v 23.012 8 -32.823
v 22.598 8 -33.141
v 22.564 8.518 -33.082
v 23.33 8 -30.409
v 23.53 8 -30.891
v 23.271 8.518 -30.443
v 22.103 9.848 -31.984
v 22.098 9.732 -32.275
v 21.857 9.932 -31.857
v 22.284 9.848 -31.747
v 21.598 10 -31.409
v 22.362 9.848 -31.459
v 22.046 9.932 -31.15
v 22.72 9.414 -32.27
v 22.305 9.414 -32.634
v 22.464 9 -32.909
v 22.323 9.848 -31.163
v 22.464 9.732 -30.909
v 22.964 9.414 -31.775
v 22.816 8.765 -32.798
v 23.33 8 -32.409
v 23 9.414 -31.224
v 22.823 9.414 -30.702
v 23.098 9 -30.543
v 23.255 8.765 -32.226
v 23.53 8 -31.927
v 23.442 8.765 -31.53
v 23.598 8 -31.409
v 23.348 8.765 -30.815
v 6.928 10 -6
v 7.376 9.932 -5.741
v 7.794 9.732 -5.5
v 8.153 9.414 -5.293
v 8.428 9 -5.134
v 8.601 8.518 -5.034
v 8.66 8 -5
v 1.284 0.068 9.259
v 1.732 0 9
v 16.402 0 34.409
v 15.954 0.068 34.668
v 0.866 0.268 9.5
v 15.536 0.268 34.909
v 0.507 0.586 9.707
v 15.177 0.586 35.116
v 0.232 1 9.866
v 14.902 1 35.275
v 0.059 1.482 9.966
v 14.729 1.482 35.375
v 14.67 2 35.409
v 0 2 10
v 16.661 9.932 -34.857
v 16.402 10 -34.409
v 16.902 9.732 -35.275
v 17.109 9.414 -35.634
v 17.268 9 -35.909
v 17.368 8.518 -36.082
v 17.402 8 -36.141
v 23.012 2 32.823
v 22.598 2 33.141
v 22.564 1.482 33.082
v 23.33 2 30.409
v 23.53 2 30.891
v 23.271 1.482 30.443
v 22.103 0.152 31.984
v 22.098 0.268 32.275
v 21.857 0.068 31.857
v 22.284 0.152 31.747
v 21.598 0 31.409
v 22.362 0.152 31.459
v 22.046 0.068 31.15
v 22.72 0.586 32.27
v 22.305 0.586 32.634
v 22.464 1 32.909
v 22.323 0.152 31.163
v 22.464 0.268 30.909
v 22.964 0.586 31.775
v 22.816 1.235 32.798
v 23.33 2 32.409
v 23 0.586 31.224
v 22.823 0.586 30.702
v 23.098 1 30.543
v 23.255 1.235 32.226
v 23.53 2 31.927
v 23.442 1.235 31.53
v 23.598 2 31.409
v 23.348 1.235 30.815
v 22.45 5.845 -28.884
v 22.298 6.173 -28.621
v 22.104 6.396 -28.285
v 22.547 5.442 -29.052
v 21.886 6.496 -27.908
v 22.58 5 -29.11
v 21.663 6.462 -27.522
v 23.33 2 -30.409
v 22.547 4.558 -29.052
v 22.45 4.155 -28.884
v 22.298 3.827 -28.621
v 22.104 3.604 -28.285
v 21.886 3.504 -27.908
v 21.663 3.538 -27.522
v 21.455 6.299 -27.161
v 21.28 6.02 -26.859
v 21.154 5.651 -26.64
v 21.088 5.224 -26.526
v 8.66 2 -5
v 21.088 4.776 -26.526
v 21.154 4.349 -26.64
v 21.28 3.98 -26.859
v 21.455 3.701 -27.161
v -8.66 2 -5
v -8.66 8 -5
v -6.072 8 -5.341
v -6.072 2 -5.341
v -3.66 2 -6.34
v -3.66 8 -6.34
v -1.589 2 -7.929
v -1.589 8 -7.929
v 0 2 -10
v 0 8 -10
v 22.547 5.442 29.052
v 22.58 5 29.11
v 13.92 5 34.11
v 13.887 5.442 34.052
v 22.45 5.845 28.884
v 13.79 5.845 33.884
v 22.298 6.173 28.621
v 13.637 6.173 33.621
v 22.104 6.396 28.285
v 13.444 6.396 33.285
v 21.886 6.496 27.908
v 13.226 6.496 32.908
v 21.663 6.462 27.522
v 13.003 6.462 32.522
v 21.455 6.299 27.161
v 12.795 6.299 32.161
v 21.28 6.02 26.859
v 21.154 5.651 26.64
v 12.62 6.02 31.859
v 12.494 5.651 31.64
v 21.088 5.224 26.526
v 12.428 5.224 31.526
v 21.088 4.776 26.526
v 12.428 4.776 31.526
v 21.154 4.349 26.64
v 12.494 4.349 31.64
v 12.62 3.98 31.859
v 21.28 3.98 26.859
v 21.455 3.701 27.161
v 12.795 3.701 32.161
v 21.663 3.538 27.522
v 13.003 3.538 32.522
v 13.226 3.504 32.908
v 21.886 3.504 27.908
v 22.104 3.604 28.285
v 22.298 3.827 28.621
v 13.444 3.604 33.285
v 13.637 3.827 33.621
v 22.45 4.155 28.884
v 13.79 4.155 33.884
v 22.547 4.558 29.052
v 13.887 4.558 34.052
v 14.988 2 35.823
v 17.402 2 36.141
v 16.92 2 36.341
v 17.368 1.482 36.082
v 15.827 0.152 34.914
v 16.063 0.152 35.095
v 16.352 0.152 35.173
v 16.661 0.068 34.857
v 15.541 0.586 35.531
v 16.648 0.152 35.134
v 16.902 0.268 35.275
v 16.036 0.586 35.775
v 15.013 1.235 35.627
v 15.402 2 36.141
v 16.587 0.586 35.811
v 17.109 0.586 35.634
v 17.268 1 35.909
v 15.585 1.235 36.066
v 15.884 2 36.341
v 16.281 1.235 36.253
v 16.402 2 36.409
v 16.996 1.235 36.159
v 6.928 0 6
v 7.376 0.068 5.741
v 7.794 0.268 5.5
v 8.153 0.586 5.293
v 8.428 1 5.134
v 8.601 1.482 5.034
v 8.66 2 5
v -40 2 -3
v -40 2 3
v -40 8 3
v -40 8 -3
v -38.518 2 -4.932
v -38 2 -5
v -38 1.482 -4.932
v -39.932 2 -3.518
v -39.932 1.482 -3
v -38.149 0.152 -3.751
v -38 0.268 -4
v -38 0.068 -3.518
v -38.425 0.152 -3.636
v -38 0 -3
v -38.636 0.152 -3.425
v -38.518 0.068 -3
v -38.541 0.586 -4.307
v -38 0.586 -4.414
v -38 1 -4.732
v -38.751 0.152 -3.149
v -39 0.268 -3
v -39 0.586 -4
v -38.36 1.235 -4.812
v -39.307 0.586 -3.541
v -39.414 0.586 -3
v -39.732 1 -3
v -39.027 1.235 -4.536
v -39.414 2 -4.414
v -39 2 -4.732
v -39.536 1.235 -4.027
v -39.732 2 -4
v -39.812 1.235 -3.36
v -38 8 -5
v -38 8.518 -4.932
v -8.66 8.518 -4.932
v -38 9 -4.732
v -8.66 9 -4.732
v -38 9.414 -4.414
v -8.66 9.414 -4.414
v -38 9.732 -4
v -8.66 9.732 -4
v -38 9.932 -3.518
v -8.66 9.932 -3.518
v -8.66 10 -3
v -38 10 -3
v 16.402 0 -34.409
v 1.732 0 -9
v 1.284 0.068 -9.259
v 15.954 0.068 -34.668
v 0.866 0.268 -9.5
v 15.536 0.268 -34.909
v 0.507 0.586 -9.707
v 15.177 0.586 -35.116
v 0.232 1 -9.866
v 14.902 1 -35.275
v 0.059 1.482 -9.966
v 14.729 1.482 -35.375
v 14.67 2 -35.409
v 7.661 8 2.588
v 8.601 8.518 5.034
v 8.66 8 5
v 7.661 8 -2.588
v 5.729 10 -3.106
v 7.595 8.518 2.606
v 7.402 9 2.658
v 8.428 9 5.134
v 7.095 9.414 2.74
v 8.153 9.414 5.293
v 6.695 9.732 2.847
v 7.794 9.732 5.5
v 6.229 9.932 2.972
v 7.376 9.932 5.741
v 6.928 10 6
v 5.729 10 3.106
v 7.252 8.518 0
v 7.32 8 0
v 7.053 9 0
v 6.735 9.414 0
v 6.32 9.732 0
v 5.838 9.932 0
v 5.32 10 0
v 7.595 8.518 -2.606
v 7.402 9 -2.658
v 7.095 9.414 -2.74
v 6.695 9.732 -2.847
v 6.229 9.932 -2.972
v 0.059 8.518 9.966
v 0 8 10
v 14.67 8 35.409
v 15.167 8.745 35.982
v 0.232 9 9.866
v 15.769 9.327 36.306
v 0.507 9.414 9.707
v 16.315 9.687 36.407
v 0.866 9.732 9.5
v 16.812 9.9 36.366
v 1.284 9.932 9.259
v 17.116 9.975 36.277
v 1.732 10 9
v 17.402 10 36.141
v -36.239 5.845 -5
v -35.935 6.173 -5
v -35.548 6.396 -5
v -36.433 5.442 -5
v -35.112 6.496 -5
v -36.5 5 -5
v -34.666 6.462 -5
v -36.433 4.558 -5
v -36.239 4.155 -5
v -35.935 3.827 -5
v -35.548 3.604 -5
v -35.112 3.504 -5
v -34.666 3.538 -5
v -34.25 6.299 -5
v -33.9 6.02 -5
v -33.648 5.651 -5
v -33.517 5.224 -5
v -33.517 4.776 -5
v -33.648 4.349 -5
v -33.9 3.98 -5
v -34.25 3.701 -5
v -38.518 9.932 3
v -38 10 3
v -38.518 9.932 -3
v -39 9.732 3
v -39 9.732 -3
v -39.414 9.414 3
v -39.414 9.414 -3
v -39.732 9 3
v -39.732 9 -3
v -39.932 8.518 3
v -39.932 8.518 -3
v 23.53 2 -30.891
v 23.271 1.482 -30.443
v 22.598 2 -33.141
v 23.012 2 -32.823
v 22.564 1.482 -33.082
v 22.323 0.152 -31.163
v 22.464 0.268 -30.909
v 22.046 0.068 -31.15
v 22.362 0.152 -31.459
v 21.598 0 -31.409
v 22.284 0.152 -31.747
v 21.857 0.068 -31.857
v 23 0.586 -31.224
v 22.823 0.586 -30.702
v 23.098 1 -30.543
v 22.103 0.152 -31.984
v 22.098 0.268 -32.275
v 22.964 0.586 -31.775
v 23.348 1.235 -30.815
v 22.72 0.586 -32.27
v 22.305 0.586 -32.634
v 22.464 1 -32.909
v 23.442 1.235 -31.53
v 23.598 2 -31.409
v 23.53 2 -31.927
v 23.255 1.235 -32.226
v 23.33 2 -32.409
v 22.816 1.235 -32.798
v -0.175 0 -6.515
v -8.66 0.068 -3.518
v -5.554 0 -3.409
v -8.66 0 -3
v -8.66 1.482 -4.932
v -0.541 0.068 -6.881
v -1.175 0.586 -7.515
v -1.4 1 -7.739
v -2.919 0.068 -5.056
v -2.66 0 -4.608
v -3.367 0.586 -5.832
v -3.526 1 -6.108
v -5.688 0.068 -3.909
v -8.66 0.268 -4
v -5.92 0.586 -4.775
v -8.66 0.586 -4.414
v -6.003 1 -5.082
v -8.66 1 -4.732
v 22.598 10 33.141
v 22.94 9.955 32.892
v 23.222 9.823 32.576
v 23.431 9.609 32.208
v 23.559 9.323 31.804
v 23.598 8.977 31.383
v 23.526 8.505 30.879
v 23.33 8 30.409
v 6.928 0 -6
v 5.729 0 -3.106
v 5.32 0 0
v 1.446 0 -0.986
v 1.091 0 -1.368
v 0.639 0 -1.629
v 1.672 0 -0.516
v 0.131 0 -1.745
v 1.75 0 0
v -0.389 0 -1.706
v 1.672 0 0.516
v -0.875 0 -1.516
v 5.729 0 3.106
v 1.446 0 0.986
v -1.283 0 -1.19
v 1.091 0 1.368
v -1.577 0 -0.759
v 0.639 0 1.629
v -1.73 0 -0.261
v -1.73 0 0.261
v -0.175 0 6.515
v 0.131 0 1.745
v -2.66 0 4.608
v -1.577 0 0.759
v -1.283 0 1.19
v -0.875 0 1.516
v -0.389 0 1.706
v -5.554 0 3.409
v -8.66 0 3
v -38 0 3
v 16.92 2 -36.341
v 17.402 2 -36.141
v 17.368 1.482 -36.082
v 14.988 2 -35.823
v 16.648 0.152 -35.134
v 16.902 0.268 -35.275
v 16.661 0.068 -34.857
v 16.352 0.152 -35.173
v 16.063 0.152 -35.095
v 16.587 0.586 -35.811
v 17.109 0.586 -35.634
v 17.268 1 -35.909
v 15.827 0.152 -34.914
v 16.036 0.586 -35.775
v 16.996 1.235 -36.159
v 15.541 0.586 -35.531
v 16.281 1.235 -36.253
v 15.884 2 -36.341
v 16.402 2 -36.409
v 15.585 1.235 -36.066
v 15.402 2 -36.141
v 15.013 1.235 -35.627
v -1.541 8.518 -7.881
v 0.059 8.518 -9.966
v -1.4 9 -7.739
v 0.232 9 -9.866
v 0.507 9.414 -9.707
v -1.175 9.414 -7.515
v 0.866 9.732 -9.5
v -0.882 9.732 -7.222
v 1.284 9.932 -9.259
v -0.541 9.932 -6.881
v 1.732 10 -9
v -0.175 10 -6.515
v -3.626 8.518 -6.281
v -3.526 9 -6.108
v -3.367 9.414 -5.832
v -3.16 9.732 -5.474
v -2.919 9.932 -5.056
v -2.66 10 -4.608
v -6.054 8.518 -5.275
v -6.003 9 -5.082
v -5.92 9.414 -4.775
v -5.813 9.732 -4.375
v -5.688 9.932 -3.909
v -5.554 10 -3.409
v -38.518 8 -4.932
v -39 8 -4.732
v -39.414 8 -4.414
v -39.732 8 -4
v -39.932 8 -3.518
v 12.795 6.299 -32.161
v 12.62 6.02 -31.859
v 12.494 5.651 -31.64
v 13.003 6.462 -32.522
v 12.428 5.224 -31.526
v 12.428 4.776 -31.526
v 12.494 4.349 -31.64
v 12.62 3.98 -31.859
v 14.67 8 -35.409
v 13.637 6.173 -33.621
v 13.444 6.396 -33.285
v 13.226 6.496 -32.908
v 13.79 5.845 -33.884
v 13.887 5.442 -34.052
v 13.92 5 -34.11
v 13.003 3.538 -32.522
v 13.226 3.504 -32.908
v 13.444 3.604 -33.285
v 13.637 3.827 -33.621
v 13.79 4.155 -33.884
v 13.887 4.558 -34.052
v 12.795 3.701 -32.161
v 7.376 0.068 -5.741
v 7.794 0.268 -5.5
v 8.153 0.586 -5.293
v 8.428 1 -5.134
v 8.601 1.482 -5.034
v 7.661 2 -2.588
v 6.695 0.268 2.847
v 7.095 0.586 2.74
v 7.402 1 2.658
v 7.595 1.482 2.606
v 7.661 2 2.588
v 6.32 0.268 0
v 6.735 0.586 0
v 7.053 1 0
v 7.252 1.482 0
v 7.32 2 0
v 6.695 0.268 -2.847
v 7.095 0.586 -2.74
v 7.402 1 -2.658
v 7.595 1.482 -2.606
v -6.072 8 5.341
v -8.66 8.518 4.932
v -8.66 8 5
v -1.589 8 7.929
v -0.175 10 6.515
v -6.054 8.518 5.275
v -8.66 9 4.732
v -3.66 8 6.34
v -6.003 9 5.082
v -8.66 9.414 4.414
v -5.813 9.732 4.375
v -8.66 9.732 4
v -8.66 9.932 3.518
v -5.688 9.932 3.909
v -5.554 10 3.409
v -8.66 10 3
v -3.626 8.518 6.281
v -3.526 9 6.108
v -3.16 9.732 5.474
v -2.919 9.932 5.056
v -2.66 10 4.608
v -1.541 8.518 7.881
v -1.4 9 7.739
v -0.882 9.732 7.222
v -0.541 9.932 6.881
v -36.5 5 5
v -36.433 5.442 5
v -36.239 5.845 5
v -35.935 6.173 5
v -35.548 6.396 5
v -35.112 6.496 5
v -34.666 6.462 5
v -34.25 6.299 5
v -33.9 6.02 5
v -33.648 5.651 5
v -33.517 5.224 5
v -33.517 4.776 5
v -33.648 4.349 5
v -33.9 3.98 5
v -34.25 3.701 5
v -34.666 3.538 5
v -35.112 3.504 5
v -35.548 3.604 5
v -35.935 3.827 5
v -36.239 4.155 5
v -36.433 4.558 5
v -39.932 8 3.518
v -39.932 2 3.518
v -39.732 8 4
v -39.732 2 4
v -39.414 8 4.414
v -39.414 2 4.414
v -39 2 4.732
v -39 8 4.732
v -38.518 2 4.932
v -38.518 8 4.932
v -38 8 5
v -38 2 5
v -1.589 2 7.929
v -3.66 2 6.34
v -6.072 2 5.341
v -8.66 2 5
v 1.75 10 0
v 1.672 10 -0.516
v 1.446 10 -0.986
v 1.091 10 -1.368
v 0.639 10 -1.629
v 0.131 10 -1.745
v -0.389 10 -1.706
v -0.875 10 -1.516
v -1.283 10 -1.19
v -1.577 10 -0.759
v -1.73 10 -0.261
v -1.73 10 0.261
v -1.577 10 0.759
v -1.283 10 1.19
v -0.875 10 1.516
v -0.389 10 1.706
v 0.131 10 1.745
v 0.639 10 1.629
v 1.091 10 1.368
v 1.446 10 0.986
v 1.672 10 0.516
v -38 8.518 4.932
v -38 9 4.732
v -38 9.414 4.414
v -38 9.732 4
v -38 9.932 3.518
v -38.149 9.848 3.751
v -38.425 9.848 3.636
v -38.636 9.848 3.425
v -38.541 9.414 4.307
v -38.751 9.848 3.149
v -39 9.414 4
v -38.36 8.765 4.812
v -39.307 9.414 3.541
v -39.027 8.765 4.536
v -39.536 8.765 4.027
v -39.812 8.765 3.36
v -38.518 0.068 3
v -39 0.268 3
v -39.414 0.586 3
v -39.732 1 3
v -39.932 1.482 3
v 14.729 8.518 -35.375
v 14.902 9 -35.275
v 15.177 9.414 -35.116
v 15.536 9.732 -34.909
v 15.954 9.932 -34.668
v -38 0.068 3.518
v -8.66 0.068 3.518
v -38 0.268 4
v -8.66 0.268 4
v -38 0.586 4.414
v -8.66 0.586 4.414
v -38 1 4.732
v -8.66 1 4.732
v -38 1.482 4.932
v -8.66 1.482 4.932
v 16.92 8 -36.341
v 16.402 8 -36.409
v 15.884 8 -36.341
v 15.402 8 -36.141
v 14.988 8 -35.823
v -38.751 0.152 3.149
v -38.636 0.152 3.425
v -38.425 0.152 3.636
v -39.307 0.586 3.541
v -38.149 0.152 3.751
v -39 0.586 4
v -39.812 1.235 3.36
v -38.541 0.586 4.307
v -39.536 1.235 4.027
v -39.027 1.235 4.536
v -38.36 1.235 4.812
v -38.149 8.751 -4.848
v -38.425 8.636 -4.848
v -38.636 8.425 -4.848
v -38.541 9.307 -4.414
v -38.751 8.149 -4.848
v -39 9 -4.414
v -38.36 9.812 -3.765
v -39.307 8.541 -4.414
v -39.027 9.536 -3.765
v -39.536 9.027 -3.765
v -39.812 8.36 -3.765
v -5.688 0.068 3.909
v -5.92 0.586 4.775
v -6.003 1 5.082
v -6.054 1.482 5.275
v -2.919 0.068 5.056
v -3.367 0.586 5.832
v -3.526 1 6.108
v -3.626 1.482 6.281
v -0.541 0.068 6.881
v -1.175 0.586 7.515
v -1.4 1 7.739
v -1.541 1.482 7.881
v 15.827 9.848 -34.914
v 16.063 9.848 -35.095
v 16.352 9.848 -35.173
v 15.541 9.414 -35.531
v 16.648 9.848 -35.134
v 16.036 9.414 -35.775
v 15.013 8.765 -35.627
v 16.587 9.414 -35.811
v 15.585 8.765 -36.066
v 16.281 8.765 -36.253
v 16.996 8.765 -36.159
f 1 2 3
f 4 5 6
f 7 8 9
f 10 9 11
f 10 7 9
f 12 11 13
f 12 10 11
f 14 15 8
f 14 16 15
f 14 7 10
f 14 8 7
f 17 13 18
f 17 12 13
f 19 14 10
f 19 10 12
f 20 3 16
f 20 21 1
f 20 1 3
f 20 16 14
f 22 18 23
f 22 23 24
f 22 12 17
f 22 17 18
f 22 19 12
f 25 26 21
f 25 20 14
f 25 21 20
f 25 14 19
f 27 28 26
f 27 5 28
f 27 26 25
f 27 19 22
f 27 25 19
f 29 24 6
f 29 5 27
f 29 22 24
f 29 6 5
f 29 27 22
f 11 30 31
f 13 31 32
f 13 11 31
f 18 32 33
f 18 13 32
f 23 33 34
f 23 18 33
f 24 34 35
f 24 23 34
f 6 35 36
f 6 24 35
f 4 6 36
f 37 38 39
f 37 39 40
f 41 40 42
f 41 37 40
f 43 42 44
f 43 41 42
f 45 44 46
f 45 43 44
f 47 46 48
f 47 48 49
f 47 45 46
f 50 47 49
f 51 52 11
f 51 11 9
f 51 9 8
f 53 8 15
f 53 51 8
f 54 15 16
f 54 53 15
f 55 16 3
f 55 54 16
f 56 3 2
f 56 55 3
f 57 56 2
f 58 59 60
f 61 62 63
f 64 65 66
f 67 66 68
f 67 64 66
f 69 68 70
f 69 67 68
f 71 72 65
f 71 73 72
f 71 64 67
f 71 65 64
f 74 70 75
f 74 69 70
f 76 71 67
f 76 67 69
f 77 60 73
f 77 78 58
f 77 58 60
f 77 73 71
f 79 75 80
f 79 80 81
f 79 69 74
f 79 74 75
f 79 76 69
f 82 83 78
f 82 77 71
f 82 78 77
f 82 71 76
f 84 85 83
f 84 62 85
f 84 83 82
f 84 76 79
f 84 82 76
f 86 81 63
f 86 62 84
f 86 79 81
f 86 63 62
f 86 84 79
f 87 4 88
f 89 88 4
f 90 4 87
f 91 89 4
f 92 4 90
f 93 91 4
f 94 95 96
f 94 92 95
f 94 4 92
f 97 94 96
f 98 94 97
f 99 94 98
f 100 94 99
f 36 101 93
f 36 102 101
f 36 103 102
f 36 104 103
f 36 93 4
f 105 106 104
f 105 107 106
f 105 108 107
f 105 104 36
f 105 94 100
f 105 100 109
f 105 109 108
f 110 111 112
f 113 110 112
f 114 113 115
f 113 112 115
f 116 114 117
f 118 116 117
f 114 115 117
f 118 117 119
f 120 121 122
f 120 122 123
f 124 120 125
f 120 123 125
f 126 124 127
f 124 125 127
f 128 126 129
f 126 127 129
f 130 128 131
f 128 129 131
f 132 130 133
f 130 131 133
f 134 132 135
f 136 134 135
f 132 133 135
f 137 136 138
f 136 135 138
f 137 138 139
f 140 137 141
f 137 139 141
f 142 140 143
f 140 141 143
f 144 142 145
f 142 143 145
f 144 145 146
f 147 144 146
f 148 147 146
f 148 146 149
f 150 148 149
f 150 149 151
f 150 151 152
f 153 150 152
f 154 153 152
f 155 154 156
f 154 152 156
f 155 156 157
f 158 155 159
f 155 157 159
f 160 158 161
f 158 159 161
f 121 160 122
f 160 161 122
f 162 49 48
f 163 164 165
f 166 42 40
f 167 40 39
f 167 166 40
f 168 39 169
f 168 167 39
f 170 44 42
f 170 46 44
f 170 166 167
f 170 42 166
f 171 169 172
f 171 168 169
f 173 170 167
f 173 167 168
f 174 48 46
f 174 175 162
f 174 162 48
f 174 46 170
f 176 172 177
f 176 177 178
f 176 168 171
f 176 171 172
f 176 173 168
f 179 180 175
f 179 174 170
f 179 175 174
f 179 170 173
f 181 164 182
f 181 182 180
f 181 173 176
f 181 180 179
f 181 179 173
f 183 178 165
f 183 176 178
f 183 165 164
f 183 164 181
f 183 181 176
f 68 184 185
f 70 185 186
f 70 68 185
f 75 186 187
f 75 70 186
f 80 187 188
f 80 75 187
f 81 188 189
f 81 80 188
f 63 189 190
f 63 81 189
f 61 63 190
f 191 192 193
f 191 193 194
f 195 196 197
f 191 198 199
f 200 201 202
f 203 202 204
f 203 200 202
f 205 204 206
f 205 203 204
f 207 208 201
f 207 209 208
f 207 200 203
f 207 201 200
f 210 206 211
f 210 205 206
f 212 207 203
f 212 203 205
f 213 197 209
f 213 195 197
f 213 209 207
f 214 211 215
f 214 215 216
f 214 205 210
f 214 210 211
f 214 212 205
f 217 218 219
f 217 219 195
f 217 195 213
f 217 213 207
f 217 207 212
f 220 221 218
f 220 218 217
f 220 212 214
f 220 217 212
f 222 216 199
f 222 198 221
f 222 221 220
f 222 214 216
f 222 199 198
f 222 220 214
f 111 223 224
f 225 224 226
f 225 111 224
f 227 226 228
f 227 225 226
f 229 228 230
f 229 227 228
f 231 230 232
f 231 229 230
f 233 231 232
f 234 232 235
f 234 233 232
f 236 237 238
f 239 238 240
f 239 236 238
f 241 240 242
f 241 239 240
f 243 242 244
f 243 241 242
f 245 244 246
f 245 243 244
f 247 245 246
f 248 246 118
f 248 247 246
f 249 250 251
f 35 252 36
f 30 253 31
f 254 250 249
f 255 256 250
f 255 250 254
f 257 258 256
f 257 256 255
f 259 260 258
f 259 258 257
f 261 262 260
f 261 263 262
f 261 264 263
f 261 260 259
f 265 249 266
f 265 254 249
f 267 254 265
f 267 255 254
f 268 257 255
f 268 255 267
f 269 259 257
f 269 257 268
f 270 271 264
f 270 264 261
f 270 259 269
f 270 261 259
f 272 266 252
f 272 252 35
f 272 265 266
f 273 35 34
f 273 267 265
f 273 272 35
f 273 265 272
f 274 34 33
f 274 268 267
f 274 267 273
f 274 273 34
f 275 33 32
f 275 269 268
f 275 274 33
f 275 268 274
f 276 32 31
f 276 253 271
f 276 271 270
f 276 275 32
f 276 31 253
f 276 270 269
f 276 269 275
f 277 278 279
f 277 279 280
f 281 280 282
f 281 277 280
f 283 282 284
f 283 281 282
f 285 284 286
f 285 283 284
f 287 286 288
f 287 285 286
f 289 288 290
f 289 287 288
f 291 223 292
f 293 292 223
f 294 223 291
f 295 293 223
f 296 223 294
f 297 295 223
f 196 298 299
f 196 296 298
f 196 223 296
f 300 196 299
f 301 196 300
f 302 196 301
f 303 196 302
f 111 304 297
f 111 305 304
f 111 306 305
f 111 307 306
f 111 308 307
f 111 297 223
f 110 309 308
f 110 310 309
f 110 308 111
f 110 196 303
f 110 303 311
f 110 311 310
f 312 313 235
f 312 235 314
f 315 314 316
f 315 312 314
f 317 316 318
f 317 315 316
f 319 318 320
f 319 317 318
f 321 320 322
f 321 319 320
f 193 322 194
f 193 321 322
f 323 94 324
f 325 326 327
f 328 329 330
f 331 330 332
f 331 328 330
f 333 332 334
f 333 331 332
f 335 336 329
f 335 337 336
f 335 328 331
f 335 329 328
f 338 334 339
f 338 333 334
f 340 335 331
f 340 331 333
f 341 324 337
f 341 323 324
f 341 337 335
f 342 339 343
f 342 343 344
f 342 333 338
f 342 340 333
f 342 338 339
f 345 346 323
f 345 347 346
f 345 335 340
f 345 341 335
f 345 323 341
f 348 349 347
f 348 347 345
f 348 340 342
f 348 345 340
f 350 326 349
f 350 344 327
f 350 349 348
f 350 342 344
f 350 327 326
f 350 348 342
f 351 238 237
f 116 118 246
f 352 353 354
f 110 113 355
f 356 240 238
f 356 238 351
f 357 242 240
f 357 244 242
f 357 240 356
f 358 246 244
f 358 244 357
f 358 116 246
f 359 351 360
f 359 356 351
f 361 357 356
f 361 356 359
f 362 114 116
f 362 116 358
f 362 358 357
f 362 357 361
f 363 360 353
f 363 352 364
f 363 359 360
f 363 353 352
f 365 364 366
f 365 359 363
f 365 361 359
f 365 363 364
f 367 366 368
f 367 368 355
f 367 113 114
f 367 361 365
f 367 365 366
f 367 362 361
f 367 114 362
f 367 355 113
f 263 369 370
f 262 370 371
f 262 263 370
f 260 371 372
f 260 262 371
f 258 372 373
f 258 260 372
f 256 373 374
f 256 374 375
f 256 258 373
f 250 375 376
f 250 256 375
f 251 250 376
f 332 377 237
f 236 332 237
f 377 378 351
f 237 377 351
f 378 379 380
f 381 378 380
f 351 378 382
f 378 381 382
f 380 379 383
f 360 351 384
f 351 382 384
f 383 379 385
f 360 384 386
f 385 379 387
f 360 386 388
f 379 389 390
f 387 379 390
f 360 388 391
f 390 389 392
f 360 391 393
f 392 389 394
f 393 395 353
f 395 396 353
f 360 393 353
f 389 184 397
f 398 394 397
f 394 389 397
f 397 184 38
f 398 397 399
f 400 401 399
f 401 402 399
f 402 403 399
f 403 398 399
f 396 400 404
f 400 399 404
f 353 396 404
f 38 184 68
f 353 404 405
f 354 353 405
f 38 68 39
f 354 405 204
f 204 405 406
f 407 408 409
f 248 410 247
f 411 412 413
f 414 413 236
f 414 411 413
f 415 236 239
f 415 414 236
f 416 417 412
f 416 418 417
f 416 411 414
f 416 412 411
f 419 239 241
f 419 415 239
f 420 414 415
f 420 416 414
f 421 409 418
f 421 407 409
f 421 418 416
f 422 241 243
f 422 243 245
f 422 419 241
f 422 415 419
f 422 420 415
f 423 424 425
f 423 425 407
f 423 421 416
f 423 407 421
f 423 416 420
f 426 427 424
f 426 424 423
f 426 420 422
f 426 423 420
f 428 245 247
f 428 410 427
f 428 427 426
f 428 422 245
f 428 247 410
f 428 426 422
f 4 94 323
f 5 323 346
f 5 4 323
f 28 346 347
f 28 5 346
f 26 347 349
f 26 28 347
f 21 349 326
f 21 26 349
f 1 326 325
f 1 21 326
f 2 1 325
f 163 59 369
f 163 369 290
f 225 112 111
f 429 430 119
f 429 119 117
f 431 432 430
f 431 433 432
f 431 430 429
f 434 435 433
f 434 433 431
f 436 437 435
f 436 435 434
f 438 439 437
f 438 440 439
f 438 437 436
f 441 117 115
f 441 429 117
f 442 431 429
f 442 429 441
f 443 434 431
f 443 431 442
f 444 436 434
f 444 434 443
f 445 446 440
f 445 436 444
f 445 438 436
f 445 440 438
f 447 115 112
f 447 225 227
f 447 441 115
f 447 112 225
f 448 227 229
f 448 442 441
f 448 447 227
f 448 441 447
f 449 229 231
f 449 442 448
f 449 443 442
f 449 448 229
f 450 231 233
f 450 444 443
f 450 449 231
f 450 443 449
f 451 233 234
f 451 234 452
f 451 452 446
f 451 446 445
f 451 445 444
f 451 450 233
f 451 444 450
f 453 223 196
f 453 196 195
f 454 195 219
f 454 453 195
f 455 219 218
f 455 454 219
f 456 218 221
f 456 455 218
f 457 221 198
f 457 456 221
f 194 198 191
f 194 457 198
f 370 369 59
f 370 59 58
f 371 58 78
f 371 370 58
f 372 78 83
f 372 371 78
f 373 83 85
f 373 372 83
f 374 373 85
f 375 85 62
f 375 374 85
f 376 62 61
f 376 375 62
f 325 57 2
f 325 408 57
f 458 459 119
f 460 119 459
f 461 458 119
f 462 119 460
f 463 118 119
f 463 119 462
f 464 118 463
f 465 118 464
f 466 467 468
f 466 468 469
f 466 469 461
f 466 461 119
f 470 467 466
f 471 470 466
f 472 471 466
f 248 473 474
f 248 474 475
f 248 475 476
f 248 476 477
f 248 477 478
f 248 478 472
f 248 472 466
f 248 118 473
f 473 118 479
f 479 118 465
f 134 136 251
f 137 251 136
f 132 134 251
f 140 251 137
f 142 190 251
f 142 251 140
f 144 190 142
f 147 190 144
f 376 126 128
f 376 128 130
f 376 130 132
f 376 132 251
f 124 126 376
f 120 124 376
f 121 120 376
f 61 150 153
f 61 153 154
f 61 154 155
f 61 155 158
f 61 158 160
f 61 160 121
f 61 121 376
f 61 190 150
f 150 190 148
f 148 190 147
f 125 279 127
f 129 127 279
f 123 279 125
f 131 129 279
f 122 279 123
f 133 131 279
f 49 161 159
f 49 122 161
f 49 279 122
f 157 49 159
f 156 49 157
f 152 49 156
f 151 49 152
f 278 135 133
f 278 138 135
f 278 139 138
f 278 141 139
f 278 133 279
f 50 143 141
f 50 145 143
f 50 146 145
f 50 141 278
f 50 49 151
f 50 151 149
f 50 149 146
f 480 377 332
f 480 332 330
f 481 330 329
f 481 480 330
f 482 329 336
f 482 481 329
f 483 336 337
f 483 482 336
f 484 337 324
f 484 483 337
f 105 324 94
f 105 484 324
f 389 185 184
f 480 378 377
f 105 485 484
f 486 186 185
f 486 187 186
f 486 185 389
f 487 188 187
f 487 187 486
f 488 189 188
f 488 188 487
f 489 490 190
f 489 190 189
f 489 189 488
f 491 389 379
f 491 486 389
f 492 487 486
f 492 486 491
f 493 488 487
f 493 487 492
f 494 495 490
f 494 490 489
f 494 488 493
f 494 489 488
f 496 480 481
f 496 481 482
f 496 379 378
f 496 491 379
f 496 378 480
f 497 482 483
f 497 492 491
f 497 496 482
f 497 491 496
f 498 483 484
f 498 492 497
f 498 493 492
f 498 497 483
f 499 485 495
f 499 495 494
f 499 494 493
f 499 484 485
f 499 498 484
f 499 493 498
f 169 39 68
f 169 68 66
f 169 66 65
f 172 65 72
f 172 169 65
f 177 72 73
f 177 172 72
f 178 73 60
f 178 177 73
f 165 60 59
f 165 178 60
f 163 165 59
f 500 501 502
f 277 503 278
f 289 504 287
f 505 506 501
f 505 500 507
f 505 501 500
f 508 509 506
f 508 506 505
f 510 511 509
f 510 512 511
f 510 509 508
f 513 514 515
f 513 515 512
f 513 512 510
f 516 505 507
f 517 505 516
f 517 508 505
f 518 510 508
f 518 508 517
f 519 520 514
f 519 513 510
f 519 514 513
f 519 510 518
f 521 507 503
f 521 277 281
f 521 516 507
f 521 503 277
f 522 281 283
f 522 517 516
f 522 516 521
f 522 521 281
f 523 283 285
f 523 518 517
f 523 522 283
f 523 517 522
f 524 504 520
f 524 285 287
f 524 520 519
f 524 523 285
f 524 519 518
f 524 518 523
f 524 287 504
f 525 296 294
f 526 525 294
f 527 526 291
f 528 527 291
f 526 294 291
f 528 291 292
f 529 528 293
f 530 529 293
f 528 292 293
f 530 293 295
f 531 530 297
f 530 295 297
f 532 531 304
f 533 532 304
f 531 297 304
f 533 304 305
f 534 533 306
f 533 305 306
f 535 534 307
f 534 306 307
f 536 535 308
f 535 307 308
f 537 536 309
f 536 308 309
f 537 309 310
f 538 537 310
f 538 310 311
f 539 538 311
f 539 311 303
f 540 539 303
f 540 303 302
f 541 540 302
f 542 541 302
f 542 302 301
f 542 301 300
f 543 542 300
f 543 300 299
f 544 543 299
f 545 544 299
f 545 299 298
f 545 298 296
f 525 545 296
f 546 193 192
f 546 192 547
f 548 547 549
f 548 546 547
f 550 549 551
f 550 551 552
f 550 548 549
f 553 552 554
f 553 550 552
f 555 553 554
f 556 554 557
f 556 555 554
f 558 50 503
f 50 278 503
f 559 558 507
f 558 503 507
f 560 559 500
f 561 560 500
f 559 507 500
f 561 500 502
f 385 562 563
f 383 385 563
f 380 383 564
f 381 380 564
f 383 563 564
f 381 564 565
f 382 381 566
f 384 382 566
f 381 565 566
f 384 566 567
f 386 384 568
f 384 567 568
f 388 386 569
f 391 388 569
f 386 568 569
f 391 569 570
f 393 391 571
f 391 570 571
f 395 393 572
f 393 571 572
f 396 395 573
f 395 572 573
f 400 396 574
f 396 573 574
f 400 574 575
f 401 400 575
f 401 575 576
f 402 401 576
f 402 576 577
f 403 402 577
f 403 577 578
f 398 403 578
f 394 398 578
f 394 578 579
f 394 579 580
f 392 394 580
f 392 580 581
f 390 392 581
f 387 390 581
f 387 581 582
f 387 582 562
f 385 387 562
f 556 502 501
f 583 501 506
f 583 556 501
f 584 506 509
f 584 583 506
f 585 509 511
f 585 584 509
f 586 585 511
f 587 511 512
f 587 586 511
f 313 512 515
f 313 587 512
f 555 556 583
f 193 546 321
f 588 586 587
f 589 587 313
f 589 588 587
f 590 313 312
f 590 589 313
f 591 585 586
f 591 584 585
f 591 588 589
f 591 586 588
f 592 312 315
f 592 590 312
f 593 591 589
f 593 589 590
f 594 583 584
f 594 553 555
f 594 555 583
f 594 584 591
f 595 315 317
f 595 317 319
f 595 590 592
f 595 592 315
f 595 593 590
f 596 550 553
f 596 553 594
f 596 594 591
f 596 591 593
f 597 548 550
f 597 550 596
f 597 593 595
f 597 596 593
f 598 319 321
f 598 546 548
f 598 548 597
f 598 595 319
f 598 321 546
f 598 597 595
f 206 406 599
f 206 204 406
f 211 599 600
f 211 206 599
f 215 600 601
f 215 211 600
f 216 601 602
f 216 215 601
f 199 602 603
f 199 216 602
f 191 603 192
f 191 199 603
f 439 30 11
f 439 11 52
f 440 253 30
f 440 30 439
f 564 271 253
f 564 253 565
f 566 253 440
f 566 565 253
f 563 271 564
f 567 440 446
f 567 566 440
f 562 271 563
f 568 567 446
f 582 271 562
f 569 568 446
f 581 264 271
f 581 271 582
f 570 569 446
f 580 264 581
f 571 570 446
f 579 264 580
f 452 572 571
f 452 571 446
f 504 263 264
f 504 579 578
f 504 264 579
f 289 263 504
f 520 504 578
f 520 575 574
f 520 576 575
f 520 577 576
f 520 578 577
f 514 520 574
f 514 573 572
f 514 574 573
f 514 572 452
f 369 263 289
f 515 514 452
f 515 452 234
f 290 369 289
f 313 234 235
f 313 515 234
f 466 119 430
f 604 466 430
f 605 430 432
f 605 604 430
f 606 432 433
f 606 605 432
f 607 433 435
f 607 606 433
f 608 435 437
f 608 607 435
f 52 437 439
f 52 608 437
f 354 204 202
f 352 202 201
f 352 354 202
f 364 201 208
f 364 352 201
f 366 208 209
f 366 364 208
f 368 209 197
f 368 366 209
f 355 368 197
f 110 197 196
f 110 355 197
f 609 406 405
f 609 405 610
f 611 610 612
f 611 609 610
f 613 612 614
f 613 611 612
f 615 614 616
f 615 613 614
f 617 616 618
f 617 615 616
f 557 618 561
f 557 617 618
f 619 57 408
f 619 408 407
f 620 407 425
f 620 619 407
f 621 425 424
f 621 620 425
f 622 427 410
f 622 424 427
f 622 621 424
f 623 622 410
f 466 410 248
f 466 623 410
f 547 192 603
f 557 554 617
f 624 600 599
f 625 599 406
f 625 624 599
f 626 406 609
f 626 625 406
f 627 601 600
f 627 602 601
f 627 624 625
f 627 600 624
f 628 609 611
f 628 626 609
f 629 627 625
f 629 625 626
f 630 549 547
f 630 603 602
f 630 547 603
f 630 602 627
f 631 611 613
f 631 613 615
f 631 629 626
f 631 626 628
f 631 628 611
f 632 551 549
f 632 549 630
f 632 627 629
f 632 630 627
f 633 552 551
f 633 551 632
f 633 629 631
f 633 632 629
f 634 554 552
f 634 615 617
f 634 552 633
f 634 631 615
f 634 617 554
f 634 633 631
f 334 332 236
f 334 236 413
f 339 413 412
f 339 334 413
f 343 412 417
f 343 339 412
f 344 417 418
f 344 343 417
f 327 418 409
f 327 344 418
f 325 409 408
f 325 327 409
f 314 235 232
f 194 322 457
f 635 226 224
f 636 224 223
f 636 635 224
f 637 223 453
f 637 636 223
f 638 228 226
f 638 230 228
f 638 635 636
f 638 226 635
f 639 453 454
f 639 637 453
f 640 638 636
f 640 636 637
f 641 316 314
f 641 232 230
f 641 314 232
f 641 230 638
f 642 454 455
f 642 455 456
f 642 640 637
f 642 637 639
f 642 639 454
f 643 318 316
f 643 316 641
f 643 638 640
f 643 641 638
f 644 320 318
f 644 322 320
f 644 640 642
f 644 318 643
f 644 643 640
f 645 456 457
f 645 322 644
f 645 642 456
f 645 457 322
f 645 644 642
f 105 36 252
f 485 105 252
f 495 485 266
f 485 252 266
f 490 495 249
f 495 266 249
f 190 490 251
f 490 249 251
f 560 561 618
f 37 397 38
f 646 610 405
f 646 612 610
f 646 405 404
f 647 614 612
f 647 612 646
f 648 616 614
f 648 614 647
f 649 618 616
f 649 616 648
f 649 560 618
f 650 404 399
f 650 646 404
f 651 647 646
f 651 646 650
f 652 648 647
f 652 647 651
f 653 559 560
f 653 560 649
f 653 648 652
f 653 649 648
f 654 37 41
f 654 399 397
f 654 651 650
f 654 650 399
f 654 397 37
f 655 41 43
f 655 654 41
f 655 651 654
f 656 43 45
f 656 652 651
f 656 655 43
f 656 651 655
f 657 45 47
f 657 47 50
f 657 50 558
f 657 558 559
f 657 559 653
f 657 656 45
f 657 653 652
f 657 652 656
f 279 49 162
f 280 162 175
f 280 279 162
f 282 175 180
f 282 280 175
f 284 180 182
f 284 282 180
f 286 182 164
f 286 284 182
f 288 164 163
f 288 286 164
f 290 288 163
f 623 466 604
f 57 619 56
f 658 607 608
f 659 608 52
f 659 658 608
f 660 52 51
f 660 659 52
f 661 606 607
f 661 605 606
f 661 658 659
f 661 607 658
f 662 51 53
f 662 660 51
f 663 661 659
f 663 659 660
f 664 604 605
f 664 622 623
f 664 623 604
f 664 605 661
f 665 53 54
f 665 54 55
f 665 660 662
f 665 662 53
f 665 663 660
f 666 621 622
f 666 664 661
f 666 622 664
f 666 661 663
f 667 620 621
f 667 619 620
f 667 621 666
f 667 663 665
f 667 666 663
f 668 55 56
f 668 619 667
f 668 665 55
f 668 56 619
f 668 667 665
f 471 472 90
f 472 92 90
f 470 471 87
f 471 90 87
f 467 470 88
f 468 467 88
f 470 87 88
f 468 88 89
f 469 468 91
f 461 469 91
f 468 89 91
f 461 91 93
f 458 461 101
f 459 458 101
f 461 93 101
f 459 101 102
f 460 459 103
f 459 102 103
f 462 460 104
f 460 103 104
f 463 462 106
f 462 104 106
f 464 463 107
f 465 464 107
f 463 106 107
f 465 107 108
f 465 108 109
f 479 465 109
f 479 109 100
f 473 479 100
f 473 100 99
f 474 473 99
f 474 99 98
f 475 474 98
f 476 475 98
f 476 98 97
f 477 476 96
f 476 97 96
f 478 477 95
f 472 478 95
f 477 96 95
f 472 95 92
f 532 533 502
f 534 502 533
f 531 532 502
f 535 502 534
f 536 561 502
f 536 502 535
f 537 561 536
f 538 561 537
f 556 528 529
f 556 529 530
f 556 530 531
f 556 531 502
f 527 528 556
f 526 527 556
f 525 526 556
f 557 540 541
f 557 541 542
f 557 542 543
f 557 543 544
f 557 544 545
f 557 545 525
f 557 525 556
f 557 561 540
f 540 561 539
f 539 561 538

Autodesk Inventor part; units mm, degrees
ref_plane "YZ Plane" through (0, 0, 0) normal (1, 0, 0) x (0, 1, 0)
ref_plane "XZ Plane" through (0, 0, 0) normal (0, 1, 0) x (-1, 0, 0)
ref_plane "XY Plane" through (0, 0, 0) normal (0, 0, 1) x (1, 0, 0)
sketch "Sketch5" plane through (0, 0, 0) normal (0, 1, 0) x (-1, 0, 0)
  circle A0 centre (0, 0) radius 1.75
  circle A1 centre (0, 0) radius 40
  line L0 (0, 0) -> (40, 0)
  line L1 (40, 0) -> (45, 0)
  line L2 (40, 0) -> (40, -5)
  line L3 (40, 0) -> (45, 0) construction
  line L4 (40, -5) -> (0, -5)
  line L5 (0, -5) -> (0, 5)
  line L6 (0, 5) -> (40, 5)
  line L7 (40, 5) -> (40, -5)
  line L8 (-15.6699, 37.141) -> (4.3301, 2.5)
  line L9 (-4.3301, -2.5) -> (-24.3301, 32.141)
  line L10 (4.3301, 2.5) -> (-4.3301, -2.5)
  line L11 (-20, 34.641) -> (-15.6699, 37.141)
  line L12 (-24.3301, 32.141) -> (-15.6699, 37.141)
  line L13 (-24.3301, -32.141) -> (-4.3301, 2.5)
  line L14 (4.3301, -2.5) -> (-15.6699, -37.141)
  line L15 (-4.3301, 2.5) -> (4.3301, -2.5)
  line L16 (-20, -34.641) -> (-24.3301, -32.141)
  line L17 (-15.6699, -37.141) -> (-24.3301, -32.141)
  dimension "d78" = 80
  dimension "d54" = 3.5
  dimension "d82" = 5
  dimension "d83" = 5
  dimension "d84" = 90
  dimension "d85" = 40
  dimension "d86" = 10
  dimension "d89" = 360
extrude "Extrusion7" add sketch "Sketch5" along normal blind 10 contours L0 L10 A0 | L0 A1 L4 L14 L15 A0 | A0 L15 L0 | A0 L10 L8 L6 A1 L0 | L10 L5 A0 | A0 L5 L6 L8 L10 | L15 L14 L4 L5 A0 | A0 L5 L15 | L15 A0 L5 | L5 A0 L10 | L10 A0 L15 | L2 L4 A1 | A1 L6 L7 | A0 L15 L13 L9 A1 L8 L6 L5 | L5 L4 L14 A1 L13 L9 L10 A0 | L10 L9 L13 L15 A0 | A1 L11 L8 | L14 L17 A1 | A1 L9 L12 | L16 L13 A1
sketch "Sketch7" plane through (5.7735, 0, 0) normal (0.866, 0, 0.5) x (0.5, 0, -0.866)
  line L0 (37.1132, 0) -> (37.1132, 10) projected
  line L1 (37.1132, 10) -> (37.1132, 5)
  line L2 (37.1132, 5) -> (32.1132, 5)
  circle A0 centre (32.1132, 5) radius 1.5
  point P0 (-2.8868, 0)
  dimension "d93" = 5
  dimension "d94" = 5
  dimension "d95" = 3
extrude "Extrusion8" cut sketch "Sketch7" against normal blind 20
sketch "Sketch8" plane through (0, 10, 0) normal (0, 1, 0) x (1, 0, 0)
  circle A0 centre (0, 0) radius 1.75
  dimension "d98" = 3.5
extrude "Extrusion9" cut sketch "Sketch8" against normal blind 10
pattern_circular "Circular Pattern7" count 3 over 360 about axis through (0, 10, 0) along (0, -1, 0) of "Extrusion8"
fillet "Fillet7" radius 10 3 edges at (5.7735, 5, 0) (-2.8868, 5, 5) (-2.8868, 5, -5)
fillet "Fillet8" radius 2 23 edges at (15.6699, 5, 37.141) (24.3301, 5, 32.141) (-40, 5, 5) (-40, 10, 0) (24.3301, 5, -32.141) (20, 10, -34.641) (15.6699, 5, -37.141) (-24.3301, 10, -5) (7.8349, 10, -23.5705) (16.4952, 10, 18.5705) (16.4952, 10, -18.5705) (-24.3301, 10, 5) (7.8349, 10, 23.5705) (-40, 5, -5) (-40, 0, 0) (20, 0, 34.641) (16.4952, 0, -18.5705) (16.4952, 0, 18.5705) (-24.3301, 0, 5) (7.8349, 0, 23.5705) (-24.3301, 0, -5) (7.8349, 0, -23.5705) (20, 0, -34.641)
properties part number "Custom_Delta_End_Effector"
